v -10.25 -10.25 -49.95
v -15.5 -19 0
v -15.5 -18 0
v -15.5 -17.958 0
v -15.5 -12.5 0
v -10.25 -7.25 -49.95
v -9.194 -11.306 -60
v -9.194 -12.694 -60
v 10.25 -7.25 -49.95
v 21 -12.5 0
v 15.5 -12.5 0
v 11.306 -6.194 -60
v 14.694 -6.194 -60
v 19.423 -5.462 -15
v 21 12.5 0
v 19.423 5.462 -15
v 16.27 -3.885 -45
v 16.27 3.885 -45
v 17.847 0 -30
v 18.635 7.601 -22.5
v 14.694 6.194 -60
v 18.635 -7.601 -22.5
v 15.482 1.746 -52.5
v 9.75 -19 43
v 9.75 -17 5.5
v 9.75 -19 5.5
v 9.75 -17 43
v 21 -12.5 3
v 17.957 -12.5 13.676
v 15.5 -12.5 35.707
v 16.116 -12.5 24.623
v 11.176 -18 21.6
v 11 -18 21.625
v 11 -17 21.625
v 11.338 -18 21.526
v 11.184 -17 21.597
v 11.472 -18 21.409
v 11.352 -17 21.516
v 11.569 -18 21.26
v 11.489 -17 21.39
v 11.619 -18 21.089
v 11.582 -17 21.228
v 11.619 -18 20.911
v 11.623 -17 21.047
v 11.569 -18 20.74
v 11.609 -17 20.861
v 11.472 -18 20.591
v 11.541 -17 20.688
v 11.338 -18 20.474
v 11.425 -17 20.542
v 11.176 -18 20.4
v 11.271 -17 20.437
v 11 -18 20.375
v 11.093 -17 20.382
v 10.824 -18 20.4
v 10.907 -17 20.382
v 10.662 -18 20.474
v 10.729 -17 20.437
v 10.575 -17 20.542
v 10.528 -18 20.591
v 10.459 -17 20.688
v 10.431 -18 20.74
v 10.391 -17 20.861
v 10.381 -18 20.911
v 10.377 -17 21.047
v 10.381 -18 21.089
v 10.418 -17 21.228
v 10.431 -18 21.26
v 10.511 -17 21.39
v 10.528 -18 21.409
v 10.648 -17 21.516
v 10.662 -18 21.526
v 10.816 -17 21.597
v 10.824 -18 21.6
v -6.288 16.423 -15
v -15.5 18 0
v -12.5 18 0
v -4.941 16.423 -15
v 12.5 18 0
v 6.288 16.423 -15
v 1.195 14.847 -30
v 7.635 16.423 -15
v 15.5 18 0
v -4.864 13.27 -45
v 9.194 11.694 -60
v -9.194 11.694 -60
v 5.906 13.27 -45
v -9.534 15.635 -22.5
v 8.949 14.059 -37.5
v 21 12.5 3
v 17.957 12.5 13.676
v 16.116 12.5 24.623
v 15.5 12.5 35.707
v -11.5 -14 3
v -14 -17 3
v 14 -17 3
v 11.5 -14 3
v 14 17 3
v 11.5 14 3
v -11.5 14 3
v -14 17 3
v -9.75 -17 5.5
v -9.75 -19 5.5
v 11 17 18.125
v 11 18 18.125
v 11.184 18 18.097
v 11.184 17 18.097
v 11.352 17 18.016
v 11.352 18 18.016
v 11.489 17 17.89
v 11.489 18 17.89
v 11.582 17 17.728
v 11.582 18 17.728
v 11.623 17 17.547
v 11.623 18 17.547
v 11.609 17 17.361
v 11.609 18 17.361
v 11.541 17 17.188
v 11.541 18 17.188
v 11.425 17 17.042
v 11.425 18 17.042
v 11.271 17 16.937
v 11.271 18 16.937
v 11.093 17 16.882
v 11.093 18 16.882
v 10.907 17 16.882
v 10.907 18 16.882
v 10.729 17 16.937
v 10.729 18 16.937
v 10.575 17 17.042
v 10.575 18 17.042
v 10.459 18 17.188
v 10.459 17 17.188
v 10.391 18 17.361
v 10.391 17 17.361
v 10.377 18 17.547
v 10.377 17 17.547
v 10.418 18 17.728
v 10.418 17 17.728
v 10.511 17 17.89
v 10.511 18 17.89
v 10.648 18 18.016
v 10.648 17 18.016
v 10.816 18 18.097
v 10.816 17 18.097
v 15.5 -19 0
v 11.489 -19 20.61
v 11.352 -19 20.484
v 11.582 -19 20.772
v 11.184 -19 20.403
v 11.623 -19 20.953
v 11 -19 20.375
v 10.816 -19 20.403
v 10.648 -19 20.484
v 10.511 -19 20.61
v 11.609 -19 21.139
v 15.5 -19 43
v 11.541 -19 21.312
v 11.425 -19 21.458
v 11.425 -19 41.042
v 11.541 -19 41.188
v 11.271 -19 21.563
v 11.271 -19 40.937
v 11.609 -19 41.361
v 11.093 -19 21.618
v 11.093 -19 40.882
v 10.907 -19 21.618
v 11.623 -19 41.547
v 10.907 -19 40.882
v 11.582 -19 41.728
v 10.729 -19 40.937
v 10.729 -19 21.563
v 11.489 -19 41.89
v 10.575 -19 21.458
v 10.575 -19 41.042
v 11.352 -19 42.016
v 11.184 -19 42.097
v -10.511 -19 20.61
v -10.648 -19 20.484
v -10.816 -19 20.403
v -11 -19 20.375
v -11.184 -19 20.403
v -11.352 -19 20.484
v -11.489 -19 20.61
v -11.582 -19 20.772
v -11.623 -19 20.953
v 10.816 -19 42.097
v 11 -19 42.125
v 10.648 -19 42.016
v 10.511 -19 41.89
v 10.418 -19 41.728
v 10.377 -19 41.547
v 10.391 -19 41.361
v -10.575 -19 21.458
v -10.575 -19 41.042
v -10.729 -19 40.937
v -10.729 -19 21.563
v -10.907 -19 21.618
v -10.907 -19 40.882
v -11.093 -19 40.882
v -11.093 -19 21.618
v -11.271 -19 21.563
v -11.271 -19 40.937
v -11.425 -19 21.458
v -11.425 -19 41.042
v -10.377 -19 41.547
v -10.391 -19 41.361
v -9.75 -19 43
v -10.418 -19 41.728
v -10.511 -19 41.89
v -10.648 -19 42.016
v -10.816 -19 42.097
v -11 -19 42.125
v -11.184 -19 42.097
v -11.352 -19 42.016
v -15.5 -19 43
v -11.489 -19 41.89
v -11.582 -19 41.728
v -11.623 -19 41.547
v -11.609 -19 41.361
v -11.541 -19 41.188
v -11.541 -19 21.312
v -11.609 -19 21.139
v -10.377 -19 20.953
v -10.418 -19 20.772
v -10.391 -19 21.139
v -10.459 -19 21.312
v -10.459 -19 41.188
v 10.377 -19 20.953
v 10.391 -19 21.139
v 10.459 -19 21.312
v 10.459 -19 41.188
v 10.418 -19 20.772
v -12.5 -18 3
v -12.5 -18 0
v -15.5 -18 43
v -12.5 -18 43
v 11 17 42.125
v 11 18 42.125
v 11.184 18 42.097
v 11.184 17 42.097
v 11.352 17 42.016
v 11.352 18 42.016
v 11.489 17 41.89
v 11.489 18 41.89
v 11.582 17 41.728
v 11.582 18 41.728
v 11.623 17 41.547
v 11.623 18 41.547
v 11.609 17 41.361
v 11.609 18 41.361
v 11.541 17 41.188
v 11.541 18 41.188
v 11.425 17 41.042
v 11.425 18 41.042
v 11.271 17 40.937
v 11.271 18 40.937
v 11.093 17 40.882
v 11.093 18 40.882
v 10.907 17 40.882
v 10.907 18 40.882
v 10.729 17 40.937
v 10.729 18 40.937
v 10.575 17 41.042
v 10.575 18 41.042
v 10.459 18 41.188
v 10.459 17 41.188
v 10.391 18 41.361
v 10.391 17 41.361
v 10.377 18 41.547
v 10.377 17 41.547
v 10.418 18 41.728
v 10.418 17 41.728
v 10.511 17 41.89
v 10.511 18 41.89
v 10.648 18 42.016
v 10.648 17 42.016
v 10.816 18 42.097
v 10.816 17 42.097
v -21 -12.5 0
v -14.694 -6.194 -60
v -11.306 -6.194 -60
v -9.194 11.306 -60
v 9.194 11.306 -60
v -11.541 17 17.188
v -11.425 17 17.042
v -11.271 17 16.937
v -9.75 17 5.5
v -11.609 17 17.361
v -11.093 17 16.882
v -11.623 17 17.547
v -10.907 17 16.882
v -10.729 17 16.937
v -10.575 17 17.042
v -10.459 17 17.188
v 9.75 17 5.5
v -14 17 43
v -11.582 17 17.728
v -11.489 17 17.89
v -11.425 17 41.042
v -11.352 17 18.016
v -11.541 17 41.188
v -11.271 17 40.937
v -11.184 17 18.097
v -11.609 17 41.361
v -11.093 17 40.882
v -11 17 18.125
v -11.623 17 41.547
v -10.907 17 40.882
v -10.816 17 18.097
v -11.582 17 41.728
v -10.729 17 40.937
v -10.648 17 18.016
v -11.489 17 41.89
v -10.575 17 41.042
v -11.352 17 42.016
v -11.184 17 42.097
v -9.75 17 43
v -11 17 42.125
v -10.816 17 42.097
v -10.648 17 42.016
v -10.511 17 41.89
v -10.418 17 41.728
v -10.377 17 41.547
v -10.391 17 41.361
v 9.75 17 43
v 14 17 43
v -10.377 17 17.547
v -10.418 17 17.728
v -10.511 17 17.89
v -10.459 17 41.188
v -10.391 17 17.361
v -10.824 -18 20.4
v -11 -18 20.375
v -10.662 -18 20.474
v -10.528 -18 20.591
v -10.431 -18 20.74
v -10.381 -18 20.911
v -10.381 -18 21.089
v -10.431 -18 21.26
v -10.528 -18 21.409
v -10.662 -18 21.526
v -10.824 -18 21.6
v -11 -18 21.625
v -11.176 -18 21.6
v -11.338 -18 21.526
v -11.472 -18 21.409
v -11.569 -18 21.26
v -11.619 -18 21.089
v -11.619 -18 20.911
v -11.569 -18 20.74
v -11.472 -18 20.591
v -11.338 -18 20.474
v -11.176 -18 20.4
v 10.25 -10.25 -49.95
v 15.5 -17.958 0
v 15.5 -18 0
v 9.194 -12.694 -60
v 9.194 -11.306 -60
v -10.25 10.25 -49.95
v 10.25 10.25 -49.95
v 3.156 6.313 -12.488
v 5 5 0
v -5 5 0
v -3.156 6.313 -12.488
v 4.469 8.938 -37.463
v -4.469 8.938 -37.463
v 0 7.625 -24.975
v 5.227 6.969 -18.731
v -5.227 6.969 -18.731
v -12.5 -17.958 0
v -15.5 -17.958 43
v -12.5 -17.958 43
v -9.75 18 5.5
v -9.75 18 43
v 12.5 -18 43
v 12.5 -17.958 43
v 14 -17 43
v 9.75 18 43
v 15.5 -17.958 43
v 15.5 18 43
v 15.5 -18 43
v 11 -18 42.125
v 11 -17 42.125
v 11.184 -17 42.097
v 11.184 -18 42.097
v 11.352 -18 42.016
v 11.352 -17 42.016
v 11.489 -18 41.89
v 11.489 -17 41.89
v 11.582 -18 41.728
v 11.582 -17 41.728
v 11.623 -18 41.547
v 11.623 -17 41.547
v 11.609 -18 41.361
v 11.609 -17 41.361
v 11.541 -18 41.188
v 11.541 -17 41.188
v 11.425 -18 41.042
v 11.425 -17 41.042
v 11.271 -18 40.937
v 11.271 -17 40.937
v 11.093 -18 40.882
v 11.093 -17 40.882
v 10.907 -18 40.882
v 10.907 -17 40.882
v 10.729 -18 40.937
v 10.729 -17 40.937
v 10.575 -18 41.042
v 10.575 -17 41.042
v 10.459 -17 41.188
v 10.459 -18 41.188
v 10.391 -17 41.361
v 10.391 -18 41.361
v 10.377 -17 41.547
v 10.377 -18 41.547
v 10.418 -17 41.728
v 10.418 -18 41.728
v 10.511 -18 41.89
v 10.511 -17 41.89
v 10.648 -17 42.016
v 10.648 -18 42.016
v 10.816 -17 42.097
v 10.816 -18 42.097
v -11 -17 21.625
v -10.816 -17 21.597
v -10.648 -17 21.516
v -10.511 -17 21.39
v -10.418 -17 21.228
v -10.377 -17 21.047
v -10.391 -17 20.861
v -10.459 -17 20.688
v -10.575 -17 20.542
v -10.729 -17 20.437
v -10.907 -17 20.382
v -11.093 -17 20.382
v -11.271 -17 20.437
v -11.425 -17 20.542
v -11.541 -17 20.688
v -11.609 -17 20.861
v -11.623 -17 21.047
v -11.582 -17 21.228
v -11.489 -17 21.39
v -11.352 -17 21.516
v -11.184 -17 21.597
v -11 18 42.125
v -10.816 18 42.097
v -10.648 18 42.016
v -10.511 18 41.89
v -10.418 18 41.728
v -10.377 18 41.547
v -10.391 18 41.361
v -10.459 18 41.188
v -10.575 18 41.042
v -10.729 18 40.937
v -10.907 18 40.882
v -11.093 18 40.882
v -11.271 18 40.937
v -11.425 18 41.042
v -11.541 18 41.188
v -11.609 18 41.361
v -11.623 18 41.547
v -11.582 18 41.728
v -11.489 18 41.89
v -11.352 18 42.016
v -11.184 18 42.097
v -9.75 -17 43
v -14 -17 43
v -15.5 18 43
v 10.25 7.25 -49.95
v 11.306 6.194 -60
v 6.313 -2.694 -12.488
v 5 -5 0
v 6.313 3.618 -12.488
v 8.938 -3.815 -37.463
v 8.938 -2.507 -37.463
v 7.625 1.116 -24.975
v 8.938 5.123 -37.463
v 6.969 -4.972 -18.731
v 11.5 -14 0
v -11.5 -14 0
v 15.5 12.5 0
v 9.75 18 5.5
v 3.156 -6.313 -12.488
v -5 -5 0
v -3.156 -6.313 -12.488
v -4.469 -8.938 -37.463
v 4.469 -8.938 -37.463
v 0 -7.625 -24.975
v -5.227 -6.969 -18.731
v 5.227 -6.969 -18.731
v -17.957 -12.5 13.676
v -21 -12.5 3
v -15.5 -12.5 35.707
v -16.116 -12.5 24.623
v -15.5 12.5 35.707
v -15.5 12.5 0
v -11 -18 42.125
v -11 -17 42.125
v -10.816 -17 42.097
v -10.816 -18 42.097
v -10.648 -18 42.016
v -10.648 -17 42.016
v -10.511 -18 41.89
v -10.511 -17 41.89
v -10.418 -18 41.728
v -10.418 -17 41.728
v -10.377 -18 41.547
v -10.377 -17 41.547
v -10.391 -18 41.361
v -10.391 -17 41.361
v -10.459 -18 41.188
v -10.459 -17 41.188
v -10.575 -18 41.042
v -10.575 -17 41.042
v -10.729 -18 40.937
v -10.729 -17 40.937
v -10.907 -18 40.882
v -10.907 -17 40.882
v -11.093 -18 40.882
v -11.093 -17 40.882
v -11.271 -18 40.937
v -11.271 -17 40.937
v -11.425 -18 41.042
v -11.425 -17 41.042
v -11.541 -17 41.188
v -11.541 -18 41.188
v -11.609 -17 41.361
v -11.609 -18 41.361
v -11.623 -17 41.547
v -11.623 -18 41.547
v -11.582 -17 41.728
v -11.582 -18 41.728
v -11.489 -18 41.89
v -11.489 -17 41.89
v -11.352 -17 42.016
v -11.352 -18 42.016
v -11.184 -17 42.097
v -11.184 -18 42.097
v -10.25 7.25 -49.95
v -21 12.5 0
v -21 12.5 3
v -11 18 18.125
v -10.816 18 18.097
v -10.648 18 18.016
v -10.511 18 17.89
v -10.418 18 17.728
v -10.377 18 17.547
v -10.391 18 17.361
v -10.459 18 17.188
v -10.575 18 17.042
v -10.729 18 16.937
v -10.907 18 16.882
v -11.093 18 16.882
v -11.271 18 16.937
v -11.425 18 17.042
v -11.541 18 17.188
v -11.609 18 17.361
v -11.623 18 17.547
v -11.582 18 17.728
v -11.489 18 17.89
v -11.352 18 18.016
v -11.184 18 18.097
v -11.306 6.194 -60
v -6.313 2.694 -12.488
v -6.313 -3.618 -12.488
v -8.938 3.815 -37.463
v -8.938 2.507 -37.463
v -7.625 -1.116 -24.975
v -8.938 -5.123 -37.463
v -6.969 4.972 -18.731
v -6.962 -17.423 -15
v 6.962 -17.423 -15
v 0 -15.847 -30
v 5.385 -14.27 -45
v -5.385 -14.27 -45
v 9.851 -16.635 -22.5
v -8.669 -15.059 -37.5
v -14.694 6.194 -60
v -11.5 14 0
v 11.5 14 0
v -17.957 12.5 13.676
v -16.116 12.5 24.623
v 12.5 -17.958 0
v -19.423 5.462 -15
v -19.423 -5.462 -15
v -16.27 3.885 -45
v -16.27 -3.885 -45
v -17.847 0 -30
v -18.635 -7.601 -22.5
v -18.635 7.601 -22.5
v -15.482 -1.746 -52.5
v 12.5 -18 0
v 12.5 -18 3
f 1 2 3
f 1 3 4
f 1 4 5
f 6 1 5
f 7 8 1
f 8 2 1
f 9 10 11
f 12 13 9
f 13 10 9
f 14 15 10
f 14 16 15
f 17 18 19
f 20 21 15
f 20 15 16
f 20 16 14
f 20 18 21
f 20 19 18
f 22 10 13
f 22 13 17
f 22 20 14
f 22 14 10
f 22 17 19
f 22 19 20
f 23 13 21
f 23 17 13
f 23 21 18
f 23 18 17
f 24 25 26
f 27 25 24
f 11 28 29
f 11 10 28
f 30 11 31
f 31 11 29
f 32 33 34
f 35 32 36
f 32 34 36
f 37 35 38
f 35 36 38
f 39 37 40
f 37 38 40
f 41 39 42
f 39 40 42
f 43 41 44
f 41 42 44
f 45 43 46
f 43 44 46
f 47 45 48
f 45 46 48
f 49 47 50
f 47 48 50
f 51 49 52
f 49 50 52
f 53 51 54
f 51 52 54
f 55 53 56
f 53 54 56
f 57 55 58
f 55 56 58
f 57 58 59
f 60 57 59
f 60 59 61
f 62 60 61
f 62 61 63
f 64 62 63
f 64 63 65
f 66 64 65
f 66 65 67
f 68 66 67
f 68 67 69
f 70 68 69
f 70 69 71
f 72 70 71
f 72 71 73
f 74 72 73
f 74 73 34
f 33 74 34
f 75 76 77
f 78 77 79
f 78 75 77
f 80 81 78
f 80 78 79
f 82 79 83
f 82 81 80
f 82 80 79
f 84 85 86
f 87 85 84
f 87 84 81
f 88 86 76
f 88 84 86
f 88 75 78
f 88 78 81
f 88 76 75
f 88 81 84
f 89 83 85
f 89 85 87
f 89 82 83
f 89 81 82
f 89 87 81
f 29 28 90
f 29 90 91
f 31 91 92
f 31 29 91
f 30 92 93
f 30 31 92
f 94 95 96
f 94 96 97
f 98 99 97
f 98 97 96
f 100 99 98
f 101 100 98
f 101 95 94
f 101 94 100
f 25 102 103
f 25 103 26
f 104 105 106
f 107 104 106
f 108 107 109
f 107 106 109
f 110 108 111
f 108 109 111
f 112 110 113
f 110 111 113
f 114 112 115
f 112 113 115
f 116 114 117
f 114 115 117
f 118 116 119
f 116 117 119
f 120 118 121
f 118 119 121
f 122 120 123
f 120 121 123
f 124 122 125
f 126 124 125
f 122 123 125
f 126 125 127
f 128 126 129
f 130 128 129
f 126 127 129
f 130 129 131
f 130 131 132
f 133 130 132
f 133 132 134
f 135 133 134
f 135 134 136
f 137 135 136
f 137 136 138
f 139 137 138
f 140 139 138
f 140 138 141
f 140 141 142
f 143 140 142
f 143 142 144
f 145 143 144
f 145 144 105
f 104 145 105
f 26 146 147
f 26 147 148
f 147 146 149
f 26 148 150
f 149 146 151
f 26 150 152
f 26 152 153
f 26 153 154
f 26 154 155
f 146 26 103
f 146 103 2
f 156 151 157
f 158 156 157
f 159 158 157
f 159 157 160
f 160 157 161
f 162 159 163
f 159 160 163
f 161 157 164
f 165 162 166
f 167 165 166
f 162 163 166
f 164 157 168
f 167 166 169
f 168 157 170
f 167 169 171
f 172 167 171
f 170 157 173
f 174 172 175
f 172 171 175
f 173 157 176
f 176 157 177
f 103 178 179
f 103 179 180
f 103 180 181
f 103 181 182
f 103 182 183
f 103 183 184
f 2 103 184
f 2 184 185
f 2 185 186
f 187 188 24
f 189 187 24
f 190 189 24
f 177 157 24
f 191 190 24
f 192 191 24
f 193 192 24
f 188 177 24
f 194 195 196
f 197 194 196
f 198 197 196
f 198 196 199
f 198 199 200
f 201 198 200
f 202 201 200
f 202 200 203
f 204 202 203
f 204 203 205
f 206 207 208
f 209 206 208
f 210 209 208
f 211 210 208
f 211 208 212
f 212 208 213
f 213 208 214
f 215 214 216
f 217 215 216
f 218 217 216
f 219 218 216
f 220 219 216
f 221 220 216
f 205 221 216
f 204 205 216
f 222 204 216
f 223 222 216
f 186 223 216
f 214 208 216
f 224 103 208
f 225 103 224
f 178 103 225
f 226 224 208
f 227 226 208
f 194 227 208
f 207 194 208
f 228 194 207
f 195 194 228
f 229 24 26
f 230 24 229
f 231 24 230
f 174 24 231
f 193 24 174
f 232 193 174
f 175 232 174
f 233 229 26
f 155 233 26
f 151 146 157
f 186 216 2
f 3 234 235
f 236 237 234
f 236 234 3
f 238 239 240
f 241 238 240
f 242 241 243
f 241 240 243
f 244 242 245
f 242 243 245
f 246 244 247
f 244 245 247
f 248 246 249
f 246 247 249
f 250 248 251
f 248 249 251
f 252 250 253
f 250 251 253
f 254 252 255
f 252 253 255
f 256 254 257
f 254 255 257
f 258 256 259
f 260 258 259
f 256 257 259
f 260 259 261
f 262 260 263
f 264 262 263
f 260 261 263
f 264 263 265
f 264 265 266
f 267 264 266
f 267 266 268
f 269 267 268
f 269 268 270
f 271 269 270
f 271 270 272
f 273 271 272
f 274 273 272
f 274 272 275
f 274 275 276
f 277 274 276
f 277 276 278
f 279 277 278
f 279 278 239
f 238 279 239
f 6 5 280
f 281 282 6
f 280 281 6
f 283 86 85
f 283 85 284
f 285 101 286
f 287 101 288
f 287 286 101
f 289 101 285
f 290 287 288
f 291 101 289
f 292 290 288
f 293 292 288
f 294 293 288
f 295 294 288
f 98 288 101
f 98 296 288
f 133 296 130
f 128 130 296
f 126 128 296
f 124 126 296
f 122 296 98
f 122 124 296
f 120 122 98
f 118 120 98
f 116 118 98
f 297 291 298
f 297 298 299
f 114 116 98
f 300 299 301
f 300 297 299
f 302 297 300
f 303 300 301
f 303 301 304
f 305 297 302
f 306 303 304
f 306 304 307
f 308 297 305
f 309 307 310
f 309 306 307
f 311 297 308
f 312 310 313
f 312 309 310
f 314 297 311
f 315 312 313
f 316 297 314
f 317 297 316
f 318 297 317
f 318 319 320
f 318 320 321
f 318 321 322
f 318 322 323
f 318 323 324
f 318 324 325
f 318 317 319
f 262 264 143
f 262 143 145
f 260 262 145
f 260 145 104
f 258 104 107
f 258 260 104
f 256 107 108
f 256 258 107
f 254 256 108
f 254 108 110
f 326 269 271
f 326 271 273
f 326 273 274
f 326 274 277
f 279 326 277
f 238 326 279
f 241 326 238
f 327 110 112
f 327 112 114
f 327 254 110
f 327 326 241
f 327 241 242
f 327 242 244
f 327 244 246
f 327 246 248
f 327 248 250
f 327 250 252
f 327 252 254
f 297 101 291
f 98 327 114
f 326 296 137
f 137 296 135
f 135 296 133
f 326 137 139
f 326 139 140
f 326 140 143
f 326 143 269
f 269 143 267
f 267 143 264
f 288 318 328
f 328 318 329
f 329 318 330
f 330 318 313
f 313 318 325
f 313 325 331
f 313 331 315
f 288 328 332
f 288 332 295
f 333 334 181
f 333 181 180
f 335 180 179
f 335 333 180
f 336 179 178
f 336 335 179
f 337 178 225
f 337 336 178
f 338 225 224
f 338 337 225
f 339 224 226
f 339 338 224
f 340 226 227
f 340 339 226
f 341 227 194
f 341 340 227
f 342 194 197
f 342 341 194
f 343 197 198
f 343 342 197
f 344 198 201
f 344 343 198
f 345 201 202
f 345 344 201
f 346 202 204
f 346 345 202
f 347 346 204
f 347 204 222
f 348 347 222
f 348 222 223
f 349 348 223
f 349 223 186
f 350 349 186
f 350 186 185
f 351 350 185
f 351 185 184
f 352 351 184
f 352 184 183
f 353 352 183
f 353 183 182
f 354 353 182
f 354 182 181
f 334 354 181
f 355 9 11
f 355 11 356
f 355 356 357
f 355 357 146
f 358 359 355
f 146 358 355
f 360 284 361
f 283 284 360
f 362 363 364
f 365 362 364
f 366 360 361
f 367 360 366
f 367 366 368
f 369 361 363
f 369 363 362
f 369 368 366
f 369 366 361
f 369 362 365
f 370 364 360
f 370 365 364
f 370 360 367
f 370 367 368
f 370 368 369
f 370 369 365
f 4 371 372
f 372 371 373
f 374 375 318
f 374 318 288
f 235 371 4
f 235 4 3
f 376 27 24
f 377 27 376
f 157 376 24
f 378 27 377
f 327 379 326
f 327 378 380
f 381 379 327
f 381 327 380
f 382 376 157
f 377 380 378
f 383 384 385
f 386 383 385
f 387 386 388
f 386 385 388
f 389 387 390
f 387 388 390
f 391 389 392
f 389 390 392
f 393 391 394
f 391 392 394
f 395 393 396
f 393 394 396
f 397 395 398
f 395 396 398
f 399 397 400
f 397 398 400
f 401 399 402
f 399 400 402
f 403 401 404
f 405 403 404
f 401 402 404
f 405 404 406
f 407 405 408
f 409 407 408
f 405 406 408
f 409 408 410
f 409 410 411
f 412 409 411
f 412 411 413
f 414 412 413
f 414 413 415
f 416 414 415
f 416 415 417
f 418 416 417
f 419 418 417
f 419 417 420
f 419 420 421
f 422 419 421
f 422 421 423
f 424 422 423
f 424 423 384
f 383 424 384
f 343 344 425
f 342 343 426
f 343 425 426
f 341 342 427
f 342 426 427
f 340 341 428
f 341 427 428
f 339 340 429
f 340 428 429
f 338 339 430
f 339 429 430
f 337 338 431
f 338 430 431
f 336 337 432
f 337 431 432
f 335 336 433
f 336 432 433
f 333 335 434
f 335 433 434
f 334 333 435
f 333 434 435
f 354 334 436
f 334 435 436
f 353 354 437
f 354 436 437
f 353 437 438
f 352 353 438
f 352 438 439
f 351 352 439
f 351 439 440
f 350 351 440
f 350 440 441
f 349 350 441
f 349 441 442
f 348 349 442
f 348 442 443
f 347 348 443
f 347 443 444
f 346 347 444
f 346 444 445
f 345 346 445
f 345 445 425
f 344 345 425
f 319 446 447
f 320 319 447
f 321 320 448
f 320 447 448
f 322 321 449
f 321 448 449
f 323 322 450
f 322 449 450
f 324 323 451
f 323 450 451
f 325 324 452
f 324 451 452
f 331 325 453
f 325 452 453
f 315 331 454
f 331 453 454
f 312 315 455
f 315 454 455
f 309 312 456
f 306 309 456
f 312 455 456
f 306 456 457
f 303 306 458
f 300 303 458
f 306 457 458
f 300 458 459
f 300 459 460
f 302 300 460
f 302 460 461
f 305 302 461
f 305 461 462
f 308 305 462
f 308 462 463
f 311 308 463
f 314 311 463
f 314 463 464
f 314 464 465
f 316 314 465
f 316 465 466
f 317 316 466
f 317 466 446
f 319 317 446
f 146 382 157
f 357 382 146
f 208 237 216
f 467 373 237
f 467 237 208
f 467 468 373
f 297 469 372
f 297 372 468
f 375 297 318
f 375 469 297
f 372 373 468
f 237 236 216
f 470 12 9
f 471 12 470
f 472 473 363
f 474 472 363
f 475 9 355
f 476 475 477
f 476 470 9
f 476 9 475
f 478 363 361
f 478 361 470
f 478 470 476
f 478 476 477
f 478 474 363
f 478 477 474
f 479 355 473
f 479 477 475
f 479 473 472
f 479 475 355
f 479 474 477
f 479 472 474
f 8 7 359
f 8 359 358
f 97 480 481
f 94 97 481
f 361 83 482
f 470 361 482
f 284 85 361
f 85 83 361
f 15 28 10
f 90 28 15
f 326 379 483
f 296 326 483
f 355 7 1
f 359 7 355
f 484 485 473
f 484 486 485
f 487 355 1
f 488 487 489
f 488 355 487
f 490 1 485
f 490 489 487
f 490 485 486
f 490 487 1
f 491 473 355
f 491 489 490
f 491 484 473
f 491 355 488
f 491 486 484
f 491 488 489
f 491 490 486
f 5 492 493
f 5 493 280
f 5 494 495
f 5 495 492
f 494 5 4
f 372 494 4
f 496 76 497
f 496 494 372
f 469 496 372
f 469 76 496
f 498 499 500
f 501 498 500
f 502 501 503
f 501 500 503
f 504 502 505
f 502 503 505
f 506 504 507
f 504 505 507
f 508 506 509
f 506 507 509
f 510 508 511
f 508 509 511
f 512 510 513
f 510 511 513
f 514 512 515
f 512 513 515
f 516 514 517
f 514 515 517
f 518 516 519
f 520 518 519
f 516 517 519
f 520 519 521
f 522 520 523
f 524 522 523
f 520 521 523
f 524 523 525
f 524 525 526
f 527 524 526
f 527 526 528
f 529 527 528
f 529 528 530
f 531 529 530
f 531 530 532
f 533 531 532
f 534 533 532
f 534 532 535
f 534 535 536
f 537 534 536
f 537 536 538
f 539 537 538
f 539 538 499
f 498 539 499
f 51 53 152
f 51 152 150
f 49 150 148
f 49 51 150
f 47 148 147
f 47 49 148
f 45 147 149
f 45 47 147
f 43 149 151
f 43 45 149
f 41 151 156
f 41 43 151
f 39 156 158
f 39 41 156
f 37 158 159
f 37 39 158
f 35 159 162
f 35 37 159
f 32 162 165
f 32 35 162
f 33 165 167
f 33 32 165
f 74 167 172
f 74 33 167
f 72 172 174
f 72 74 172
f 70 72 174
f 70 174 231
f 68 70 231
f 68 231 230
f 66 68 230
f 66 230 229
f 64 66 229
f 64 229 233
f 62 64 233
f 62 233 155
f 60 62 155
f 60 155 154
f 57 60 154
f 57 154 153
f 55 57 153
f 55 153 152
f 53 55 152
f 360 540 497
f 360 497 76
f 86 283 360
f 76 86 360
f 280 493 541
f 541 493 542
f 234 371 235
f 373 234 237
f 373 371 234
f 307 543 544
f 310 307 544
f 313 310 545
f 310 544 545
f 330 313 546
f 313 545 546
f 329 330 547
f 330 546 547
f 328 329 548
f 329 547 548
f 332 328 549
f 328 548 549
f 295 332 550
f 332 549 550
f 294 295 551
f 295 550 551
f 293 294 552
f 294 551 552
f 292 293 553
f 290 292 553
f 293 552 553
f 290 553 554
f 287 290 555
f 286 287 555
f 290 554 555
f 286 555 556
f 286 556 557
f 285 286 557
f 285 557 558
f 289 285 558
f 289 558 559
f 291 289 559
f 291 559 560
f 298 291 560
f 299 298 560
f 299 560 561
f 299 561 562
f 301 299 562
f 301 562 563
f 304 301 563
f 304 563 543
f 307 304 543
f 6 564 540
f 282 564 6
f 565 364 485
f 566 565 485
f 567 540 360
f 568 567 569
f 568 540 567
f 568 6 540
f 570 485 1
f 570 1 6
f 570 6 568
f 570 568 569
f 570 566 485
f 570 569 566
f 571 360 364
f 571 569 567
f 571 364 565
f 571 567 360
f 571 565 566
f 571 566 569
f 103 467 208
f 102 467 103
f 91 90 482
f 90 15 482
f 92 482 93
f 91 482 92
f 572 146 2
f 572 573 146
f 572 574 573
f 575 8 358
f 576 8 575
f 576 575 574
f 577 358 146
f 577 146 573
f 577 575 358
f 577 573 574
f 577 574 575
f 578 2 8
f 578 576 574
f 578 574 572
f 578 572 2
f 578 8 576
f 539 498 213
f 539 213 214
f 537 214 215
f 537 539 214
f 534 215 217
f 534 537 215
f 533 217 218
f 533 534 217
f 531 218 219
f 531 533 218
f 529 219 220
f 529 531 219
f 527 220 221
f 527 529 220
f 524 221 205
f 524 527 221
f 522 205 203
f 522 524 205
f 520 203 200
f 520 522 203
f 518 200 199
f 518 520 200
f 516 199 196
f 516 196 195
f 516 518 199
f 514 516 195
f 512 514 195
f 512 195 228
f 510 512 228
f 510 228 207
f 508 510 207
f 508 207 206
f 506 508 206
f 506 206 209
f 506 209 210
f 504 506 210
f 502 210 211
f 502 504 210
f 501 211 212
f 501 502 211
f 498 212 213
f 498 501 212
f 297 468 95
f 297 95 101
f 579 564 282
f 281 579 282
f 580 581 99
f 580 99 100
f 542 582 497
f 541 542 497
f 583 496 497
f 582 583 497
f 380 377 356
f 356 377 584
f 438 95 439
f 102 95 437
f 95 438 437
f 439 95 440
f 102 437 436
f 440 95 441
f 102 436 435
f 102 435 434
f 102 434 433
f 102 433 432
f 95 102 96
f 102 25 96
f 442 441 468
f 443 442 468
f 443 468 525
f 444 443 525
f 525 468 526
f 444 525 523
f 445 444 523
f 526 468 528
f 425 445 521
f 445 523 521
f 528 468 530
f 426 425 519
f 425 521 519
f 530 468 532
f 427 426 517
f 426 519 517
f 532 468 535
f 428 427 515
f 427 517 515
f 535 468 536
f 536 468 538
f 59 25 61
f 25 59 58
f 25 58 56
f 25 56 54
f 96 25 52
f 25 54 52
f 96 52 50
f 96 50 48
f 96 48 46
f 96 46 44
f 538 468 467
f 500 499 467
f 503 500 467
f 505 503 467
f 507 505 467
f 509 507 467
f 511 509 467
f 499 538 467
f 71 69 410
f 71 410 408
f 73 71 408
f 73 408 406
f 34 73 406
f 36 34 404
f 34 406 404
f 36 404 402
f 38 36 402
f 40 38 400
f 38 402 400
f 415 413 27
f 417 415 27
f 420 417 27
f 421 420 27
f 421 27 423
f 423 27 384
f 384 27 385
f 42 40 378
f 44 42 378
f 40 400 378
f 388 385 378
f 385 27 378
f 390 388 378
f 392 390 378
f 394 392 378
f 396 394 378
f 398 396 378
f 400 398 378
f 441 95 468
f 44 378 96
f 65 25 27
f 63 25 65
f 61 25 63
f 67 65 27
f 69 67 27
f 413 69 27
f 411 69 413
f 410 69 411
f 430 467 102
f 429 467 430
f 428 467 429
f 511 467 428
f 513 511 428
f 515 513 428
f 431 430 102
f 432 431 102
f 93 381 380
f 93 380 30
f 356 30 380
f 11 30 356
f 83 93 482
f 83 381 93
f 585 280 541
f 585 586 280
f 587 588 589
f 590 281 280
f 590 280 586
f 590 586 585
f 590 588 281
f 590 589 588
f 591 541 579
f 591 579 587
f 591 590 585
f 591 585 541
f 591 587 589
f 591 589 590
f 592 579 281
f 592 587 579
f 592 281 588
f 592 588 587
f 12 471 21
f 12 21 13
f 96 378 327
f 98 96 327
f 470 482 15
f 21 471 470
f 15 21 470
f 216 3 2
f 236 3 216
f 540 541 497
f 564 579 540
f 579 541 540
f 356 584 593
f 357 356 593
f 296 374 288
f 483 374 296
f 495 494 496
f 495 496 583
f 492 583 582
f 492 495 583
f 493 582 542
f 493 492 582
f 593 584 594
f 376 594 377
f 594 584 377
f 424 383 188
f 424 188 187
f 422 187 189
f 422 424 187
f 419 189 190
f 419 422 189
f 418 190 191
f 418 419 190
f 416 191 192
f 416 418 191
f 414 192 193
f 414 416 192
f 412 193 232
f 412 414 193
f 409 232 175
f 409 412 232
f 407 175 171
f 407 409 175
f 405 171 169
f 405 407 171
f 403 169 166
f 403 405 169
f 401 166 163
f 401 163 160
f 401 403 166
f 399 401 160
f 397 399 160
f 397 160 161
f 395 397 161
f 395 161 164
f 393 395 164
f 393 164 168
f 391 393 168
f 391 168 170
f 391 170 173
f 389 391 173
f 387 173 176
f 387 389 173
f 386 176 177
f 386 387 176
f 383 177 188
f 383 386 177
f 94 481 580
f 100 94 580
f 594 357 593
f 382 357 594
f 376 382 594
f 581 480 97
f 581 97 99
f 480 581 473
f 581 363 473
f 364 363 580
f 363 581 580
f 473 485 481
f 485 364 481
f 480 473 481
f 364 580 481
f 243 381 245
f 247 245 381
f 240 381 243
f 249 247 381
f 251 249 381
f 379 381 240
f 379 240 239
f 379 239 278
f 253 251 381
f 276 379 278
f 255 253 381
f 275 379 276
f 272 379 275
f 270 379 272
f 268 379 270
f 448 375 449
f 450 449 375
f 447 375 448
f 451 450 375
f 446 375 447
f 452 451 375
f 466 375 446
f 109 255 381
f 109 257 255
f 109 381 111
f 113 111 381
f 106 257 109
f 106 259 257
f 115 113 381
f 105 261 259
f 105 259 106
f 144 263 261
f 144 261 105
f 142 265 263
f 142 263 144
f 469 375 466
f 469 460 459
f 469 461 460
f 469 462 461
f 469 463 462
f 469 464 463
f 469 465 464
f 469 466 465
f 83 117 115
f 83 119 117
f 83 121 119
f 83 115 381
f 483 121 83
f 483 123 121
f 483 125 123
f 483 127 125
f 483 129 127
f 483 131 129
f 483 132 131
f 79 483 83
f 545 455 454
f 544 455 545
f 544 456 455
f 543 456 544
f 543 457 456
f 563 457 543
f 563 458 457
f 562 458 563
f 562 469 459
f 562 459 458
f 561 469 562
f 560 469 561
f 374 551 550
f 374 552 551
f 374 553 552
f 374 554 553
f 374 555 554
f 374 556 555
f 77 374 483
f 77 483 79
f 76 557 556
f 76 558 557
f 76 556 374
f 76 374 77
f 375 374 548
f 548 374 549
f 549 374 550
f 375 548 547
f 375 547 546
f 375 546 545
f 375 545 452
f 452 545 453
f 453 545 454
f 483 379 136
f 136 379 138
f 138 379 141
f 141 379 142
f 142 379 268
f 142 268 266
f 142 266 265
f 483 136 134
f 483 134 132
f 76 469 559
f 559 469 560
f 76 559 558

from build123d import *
from build123d.topology import SkipClean

# Parameters (mm, degrees)
BOSS_EXTRUDE1_DEPTH      = 3
SKETCH2_W                = 25
SKETCH2_H                = 2
BOSS_EXTRUDE2_DEPTH      = 40
SKETCH3_R                = 0.625
CUT_EXTRUDE1_DEPTH       = 3
SKETCH4_R                = 0.625
CUT_EXTRUDE2_DEPTH       = 3
SKETCH7_W                = 19.5
SKETCH7_H                = 75
CUT_EXTRUDE5_DEPTH       = 40
SKETCH10_W               = 25
SKETCH10_H               = 3
BOSS_EXTRUDE4_DEPTH      = 10
SKETCH11_W               = 25
SKETCH11_H               = 3
BOSS_EXTRUDE5_DEPTH      = 10
SKETCH12_W               = 3
SKETCH12_H               = 25
BOSS_EXTRUDE6_DEPTH      = 10
SKETCH13_W               = 3
SKETCH13_H               = 25
BOSS_EXTRUDE7_DEPTH      = 10
SKETCH14_W               = 43
SKETCH14_H               = 35.95813892
BOSS_EXTRUDE11_DEPTH     = 3
SKETCH15_W               = 43
SKETCH15_H               = 35.95813892
BOSS_EXTRUDE12_DEPTH     = 3
SKETCH16_W               = 23
SKETCH16_H               = 28
CUT_EXTRUDE6_DEPTH       = 13
FILLET1_R                = 10
FILLET2_R                = 10
SKETCH19_W               = 28
SKETCH19_H               = 32
CUT_EXTRUDE9_DEPTH       = 40
CUT_EXTRUDE11_DEPTH      = 58.835974964
CUT_EXTRUDE11_DEPTH_BACK = 58.835974964
SKETCH20_W               = 25.25
SKETCH20_H               = 11.847644437
SKETCH20_W_2             = 25
SKETCH20_H_2             = 13.837487399
CUT_EXTRUDE13_DEPTH      = 56.982140009
CUT_EXTRUDE13_DEPTH_BACK = 56.982140009
SKETCH22_W               = 10
SKETCH22_H               = 25
FILLET3_R                = 100
FILLET4_R                = 100
SKETCH25_W               = 28
SKETCH25_H               = 2
CUT_EXTRUDE17_DEPTH      = 40
SKETCH27_R               = 0.625
BOSS_EXTRUDE14_DEPTH     = 1
SKETCH31_W               = 10
SKETCH31_H               = 10
BOSS_EXTRUDE16_DEPTH     = 60
BOSS_EXTRUDE16_TAPER     = 6


# Some blends are built 0.0001 mm under size
with BuildPart() as part:
    # Sketch1 → Boss-Extrude1 (new body)
    with BuildSketch(Plane.XY):
        Polygon((12.5, 12.5), (21, 12.5), (21, -12.5), (12.5, -12.5), (12.5, -18), (-12.5, -18), (-12.5, -12.5), (-21, -12.5), (-21, 12.5), (-12.5, 12.5), (-12.5, 18), (12.5, 18), align=None)
    extrude(amount=BOSS_EXTRUDE1_DEPTH)

    # Sketch2 → Boss-Extrude2 (add)
    with BuildSketch(Plane.XY.offset(3)):
        with Locations((0, 17)):
            Rectangle(SKETCH2_W, SKETCH2_H)
        with Locations((0, -17)):
            Rectangle(SKETCH2_W, SKETCH2_H)
    extrude(amount=BOSS_EXTRUDE2_DEPTH)

    # Sketch3 → Cut-Extrude1 (cut)
    with BuildSketch(Plane(origin=(0, 18, 0), x_dir=(1, 0, 0), z_dir=(0, 1, 0))):
        with Locations(Location((-11, -17.5, 0), (0, 0, 270))):
            Circle(SKETCH3_R)
        with Locations(Location((11, -17.5, 0), (0, 0, 270))):
            Circle(SKETCH3_R)
        with Locations(Location((-11, -41.5, 0), (0, 0, 270))):
            Circle(SKETCH3_R)
        with Locations(Location((11, -41.5, 0), (0, 0, 270))):
            Circle(SKETCH3_R)
    extrude(amount=-CUT_EXTRUDE1_DEPTH, mode=Mode.SUBTRACT)

    # Sketch4 → Cut-Extrude2 (cut)
    with BuildSketch(Plane(origin=(0, -16, 0), x_dir=(1, 0, 0), z_dir=(0, 1, 0))):
        with Locations(Location((-11, -41.5, 0), (0, 0, 270))):
            Circle(SKETCH4_R)
        with Locations(Location((11, -41.5, 0), (0, 0, 270))):
            Circle(SKETCH4_R)
        with Locations(Location((-11, -21, 0), (0, 0, 270))):
            Circle(SKETCH4_R)
        with Locations(Location((11, -21, 0), (0, 0, 270))):
            Circle(SKETCH4_R)
    extrude(amount=-CUT_EXTRUDE2_DEPTH, mode=Mode.SUBTRACT)

    # Sketch7 → Cut-Extrude5 (cut)
    with BuildSketch(Plane(origin=(0, 18, 0), x_dir=(1, 0, 0), z_dir=(0, 1, 0))):
        with Locations((0, -43)):
            Rectangle(SKETCH7_W, SKETCH7_H)
    extrude(amount=-CUT_EXTRUDE5_DEPTH, mode=Mode.SUBTRACT)

    # Sketch10 → Boss-Extrude4 (add)
    with BuildSketch(Plane(origin=(0, 18, 0), x_dir=(1, 0, 0), z_dir=(0, 1, 0))):
        with Locations((0, -1.5)):
            Rectangle(SKETCH10_W, SKETCH10_H)
    extrude(amount=BOSS_EXTRUDE4_DEPTH)

    # Sketch11 → Boss-Extrude5 (add)
    with BuildSketch(Plane.XZ.offset(18)):
        with Locations((0, 1.5)):
            Rectangle(SKETCH11_W, SKETCH11_H)
    extrude(amount=BOSS_EXTRUDE5_DEPTH)

    # Sketch12 → Boss-Extrude6 (add)
    with BuildSketch(Plane.ZY.offset(21)):
        with Locations((1.5, 0)):
            Rectangle(SKETCH12_W, SKETCH12_H)
    extrude(amount=BOSS_EXTRUDE6_DEPTH)

    # Sketch13 → Boss-Extrude7 (add)
    with BuildSketch(Plane(origin=(21, 0, 0), x_dir=(0, 0, -1), z_dir=(1, 0, 0))):
        with Locations((-1.5, 0)):
            Rectangle(SKETCH13_W, SKETCH13_H)
    extrude(amount=BOSS_EXTRUDE7_DEPTH)

    # Sketch14 → Boss-Extrude11 (add)
    with BuildSketch(Plane.ZY.offset(12.5)):
        with Locations((21.5, 0.02093054)):
            Rectangle(SKETCH14_W, SKETCH14_H)
    extrude(amount=BOSS_EXTRUDE11_DEPTH)

    # Sketch15 → Boss-Extrude12 (add)
    with BuildSketch(Plane(origin=(12.5, 0, 0), x_dir=(0, 0, -1), z_dir=(1, 0, 0))):
        with Locations((-21.5, 0.02093054)):
            Rectangle(SKETCH15_W, SKETCH15_H)
    extrude(amount=BOSS_EXTRUDE12_DEPTH)

    # Sketch16 → Cut-Extrude6 (cut)
    with BuildSketch(Plane(origin=(0, 0, 0), x_dir=(-1, 0, 0), z_dir=(0, 0, -1))):
        Rectangle(SKETCH16_W, SKETCH16_H)
    extrude(amount=-CUT_EXTRUDE6_DEPTH, mode=Mode.SUBTRACT)

    # Fillet1
    fillet1_edges = [part.edges().sort_by_distance(p)[0] for p in [
        (31, 12.5, 1.5),
    ]]
    fillet(fillet1_edges, radius=FILLET1_R)

    # Fillet2
    fillet2_edges = [part.edges().sort_by_distance(p)[0] for p in [
        (12.5, 28, 1.5),
        (-12.5, 28, 1.5),
        (-31, 12.5, 1.5),
        (12.5, -28, 1.5),
        (-31, -12.5, 1.5),
        (-12.5, -28, 1.5),
        (31, -12.5, 1.5),
    ]]
    fillet(fillet2_edges, radius=FILLET2_R - 0.0001)  # a hair under: the kernel refuses the full size

    # Sketch19 → Cut-Extrude9 (cut)
    with BuildSketch(Plane.XY.offset(43)):
        Rectangle(SKETCH19_W, SKETCH19_H)
    extrude(amount=-CUT_EXTRUDE9_DEPTH, mode=Mode.SUBTRACT)

    # Sketch20 → Cut-Extrude11 (cut, two sides: drawn at the far end of the back side and taken through both)
    with BuildSketch(Plane.XY.offset(3).offset(-CUT_EXTRUDE11_DEPTH_BACK)):
        with Locations((0, 23.923822218)):
            Rectangle(SKETCH20_W, SKETCH20_H)
        with Locations((0, -24.918743699)):
            Rectangle(SKETCH20_W_2, SKETCH20_H_2)
    extrude(amount=CUT_EXTRUDE11_DEPTH + CUT_EXTRUDE11_DEPTH_BACK, mode=Mode.SUBTRACT)

    # Sketch22 → Cut-Extrude13 (cut, two sides: drawn at the far end of the back side and taken through both)
    with BuildSketch(Plane(origin=(0, 0, 0), x_dir=(-1, 0, 0), z_dir=(0, 0, -1)).offset(-CUT_EXTRUDE13_DEPTH_BACK)):
        with Locations((26, 0)):
            Rectangle(SKETCH22_W, SKETCH22_H)
        with Locations((-26, 0)):
            Rectangle(SKETCH22_W, SKETCH22_H)
    extrude(amount=CUT_EXTRUDE13_DEPTH + CUT_EXTRUDE13_DEPTH_BACK, mode=Mode.SUBTRACT)

    # Fillet3
    # the kernel refuses this fillet: 100 mm, written as the material it adds along each edge
    with BuildSketch(Plane(origin=(-15.5, -12.5, 3), x_dir=(0, 0, 1), z_dir=(0, 1, 0))) as fillet3_piece_1:
        with BuildLine():
            CenterArc((32.707032883, -100), FILLET3_R, 90, 19.091052513)
            Line((0, -5.5), (0, 0))
            Line((0, 0), (32.707032883, 0))
        make_face()
    extrude(amount=25)

    # Fillet4
    # the kernel refuses this fillet: 100 mm, written as the material it adds along each edge
    with BuildSketch(Plane(origin=(15.5, -12.5, 3), x_dir=(1, 0, 0), z_dir=(0, 1, 0))) as fillet4_piece_1:
        with BuildLine():
            CenterArc((100, -32.707032883), FILLET4_R, 160.908947487, 19.091052513)
            Line((0, -32.707032883), (0, 0))
            Line((0, 0), (5.5, 0))
        make_face()
    extrude(amount=25)

    # Sketch25 → Cut-Extrude17 (cut)
    with BuildSketch(Plane.XY.offset(43)):
        with Locations((0, 16)):
            Rectangle(SKETCH25_W, SKETCH25_H)
        with Locations((0, -16)):
            Rectangle(SKETCH25_W, SKETCH25_H)
    extrude(amount=-CUT_EXTRUDE17_DEPTH, mode=Mode.SUBTRACT)

    # Sketch27 → Boss-Extrude14 (add)
    with SkipClean():  # the faces are left unmerged after this step: merging them gives an invalid solid
        with BuildSketch(Plane.XZ.offset(18)):
            Polygon((-15.5, 43), (-9.75, 43), (-9.75, 5.5), (9.75, 5.5), (9.75, 43), (15.5, 43), (15.5, 0), (-15.5, 0), align=None)
            with Locations(Location((-11, 41.5, 0), (0, 0, 90))):
                Circle(SKETCH27_R, mode=Mode.SUBTRACT)
            with Locations(Location((-11, 21, 0), (0, 0, 270))):
                Circle(SKETCH27_R, mode=Mode.SUBTRACT)
            with Locations(Location((11, 21, 0), (0, 0, 270))):
                Circle(SKETCH27_R, mode=Mode.SUBTRACT)
            with Locations(Location((11, 41.5, 0), (0, 0, 90))):
                Circle(SKETCH27_R, mode=Mode.SUBTRACT)
        extrude(amount=BOSS_EXTRUDE14_DEPTH)
    add(part.part.scale(1), mode=Mode.REPLACE)  # the faces are merged on a copy

    # Sketch31 → Boss-Extrude16 (add)
    with BuildSketch(Plane(origin=(0, 0, 0), x_dir=(-1, 0, 0), z_dir=(0, 0, -1))):
        Polygon((-15.5, 18), (-15.5, 12.5), (-21, 12.5), (-21, -12.5), (-15.5, -12.5), (-15.5, -19), (15.5, -19), (15.5, -12.5), (21, -12.5), (21, 12.5), (15.5, 12.5), (15.5, 18), align=None)
        Rectangle(SKETCH31_W, SKETCH31_H, mode=Mode.SUBTRACT)
    extrude(amount=BOSS_EXTRUDE16_DEPTH, taper=BOSS_EXTRUDE16_TAPER)


solid = part.part
